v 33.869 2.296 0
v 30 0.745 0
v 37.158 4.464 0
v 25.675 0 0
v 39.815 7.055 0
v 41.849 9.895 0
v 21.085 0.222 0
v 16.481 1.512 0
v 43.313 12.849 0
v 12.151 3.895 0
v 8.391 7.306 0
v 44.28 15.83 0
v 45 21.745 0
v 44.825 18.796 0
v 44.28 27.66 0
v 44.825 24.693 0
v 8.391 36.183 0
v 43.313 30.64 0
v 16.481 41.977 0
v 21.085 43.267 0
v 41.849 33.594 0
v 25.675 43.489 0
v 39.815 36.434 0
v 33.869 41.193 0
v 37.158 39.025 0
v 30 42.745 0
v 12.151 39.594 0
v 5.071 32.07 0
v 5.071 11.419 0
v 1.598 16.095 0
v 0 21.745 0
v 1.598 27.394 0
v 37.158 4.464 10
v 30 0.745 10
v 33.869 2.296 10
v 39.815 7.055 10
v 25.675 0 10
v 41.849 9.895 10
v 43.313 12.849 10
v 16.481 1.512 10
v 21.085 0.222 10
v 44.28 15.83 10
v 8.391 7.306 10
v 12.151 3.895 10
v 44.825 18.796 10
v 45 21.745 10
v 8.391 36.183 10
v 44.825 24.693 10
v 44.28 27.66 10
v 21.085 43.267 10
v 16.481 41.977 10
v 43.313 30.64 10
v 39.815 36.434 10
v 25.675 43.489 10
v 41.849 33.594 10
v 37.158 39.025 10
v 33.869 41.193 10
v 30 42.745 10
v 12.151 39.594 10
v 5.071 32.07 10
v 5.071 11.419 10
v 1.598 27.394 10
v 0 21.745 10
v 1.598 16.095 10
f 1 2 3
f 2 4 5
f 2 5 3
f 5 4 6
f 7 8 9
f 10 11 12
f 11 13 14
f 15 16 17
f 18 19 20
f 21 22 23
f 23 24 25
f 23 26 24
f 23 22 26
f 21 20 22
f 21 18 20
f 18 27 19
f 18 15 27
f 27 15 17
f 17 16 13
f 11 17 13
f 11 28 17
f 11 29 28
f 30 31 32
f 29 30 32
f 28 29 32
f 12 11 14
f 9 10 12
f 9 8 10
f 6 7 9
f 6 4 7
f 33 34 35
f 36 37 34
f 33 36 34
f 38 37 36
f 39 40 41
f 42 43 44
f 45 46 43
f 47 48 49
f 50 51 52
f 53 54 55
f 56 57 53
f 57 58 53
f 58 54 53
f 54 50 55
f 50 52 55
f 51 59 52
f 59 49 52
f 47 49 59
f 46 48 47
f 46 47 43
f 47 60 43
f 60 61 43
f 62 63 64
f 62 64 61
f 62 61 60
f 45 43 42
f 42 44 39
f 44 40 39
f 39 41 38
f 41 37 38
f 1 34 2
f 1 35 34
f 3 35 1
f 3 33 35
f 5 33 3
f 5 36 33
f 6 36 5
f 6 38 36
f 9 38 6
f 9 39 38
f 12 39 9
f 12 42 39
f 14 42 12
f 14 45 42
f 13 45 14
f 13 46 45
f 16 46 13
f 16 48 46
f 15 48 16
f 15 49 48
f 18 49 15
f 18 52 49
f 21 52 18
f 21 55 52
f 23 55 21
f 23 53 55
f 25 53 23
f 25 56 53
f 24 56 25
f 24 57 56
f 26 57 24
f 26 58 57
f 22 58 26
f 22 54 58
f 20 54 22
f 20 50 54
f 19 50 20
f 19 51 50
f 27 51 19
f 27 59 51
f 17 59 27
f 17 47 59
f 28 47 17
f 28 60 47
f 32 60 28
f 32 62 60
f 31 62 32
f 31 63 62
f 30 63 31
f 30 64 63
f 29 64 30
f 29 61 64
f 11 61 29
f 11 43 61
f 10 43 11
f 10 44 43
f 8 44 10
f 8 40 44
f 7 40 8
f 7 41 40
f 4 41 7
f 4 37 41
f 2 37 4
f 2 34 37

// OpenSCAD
$fn = 32;

// ----------------------------------------------------------------------
// Cam disc: base radius 15.0 mm, lift 12.0 mm, 32 profile points
// ----------------------------------------------------------------------

// --- parameters (mm) ---
profile_height = 10;      // extrusion height
profile_points = 32;      // points of the closed outline

profile = [[45, 21.745], [44.825, 24.693], [44.28, 27.66], [43.313, 30.64], [41.849, 33.594], [39.815, 36.434], [37.158, 39.025], [33.869, 41.193], [30, 42.745], [25.675, 43.489], [21.085, 43.267], [16.481, 41.977], [12.151, 39.594], [8.391, 36.183], [5.071, 32.07], [1.598, 27.394], [0, 21.745], [1.598, 16.095], [5.071, 11.419], [8.391, 7.306], [12.151, 3.895], [16.481, 1.512], [21.085, 0.222], [25.675, 0], [30, 0.745], [33.869, 2.296], [37.158, 4.464], [39.815, 7.055], [41.849, 9.895], [43.313, 12.849], [44.28, 15.83], [44.825, 18.796]];  // single closed polygon, 32 points, counter clockwise

// --- the one profile operation ---
linear_extrude(height = profile_height) polygon(points = profile);
